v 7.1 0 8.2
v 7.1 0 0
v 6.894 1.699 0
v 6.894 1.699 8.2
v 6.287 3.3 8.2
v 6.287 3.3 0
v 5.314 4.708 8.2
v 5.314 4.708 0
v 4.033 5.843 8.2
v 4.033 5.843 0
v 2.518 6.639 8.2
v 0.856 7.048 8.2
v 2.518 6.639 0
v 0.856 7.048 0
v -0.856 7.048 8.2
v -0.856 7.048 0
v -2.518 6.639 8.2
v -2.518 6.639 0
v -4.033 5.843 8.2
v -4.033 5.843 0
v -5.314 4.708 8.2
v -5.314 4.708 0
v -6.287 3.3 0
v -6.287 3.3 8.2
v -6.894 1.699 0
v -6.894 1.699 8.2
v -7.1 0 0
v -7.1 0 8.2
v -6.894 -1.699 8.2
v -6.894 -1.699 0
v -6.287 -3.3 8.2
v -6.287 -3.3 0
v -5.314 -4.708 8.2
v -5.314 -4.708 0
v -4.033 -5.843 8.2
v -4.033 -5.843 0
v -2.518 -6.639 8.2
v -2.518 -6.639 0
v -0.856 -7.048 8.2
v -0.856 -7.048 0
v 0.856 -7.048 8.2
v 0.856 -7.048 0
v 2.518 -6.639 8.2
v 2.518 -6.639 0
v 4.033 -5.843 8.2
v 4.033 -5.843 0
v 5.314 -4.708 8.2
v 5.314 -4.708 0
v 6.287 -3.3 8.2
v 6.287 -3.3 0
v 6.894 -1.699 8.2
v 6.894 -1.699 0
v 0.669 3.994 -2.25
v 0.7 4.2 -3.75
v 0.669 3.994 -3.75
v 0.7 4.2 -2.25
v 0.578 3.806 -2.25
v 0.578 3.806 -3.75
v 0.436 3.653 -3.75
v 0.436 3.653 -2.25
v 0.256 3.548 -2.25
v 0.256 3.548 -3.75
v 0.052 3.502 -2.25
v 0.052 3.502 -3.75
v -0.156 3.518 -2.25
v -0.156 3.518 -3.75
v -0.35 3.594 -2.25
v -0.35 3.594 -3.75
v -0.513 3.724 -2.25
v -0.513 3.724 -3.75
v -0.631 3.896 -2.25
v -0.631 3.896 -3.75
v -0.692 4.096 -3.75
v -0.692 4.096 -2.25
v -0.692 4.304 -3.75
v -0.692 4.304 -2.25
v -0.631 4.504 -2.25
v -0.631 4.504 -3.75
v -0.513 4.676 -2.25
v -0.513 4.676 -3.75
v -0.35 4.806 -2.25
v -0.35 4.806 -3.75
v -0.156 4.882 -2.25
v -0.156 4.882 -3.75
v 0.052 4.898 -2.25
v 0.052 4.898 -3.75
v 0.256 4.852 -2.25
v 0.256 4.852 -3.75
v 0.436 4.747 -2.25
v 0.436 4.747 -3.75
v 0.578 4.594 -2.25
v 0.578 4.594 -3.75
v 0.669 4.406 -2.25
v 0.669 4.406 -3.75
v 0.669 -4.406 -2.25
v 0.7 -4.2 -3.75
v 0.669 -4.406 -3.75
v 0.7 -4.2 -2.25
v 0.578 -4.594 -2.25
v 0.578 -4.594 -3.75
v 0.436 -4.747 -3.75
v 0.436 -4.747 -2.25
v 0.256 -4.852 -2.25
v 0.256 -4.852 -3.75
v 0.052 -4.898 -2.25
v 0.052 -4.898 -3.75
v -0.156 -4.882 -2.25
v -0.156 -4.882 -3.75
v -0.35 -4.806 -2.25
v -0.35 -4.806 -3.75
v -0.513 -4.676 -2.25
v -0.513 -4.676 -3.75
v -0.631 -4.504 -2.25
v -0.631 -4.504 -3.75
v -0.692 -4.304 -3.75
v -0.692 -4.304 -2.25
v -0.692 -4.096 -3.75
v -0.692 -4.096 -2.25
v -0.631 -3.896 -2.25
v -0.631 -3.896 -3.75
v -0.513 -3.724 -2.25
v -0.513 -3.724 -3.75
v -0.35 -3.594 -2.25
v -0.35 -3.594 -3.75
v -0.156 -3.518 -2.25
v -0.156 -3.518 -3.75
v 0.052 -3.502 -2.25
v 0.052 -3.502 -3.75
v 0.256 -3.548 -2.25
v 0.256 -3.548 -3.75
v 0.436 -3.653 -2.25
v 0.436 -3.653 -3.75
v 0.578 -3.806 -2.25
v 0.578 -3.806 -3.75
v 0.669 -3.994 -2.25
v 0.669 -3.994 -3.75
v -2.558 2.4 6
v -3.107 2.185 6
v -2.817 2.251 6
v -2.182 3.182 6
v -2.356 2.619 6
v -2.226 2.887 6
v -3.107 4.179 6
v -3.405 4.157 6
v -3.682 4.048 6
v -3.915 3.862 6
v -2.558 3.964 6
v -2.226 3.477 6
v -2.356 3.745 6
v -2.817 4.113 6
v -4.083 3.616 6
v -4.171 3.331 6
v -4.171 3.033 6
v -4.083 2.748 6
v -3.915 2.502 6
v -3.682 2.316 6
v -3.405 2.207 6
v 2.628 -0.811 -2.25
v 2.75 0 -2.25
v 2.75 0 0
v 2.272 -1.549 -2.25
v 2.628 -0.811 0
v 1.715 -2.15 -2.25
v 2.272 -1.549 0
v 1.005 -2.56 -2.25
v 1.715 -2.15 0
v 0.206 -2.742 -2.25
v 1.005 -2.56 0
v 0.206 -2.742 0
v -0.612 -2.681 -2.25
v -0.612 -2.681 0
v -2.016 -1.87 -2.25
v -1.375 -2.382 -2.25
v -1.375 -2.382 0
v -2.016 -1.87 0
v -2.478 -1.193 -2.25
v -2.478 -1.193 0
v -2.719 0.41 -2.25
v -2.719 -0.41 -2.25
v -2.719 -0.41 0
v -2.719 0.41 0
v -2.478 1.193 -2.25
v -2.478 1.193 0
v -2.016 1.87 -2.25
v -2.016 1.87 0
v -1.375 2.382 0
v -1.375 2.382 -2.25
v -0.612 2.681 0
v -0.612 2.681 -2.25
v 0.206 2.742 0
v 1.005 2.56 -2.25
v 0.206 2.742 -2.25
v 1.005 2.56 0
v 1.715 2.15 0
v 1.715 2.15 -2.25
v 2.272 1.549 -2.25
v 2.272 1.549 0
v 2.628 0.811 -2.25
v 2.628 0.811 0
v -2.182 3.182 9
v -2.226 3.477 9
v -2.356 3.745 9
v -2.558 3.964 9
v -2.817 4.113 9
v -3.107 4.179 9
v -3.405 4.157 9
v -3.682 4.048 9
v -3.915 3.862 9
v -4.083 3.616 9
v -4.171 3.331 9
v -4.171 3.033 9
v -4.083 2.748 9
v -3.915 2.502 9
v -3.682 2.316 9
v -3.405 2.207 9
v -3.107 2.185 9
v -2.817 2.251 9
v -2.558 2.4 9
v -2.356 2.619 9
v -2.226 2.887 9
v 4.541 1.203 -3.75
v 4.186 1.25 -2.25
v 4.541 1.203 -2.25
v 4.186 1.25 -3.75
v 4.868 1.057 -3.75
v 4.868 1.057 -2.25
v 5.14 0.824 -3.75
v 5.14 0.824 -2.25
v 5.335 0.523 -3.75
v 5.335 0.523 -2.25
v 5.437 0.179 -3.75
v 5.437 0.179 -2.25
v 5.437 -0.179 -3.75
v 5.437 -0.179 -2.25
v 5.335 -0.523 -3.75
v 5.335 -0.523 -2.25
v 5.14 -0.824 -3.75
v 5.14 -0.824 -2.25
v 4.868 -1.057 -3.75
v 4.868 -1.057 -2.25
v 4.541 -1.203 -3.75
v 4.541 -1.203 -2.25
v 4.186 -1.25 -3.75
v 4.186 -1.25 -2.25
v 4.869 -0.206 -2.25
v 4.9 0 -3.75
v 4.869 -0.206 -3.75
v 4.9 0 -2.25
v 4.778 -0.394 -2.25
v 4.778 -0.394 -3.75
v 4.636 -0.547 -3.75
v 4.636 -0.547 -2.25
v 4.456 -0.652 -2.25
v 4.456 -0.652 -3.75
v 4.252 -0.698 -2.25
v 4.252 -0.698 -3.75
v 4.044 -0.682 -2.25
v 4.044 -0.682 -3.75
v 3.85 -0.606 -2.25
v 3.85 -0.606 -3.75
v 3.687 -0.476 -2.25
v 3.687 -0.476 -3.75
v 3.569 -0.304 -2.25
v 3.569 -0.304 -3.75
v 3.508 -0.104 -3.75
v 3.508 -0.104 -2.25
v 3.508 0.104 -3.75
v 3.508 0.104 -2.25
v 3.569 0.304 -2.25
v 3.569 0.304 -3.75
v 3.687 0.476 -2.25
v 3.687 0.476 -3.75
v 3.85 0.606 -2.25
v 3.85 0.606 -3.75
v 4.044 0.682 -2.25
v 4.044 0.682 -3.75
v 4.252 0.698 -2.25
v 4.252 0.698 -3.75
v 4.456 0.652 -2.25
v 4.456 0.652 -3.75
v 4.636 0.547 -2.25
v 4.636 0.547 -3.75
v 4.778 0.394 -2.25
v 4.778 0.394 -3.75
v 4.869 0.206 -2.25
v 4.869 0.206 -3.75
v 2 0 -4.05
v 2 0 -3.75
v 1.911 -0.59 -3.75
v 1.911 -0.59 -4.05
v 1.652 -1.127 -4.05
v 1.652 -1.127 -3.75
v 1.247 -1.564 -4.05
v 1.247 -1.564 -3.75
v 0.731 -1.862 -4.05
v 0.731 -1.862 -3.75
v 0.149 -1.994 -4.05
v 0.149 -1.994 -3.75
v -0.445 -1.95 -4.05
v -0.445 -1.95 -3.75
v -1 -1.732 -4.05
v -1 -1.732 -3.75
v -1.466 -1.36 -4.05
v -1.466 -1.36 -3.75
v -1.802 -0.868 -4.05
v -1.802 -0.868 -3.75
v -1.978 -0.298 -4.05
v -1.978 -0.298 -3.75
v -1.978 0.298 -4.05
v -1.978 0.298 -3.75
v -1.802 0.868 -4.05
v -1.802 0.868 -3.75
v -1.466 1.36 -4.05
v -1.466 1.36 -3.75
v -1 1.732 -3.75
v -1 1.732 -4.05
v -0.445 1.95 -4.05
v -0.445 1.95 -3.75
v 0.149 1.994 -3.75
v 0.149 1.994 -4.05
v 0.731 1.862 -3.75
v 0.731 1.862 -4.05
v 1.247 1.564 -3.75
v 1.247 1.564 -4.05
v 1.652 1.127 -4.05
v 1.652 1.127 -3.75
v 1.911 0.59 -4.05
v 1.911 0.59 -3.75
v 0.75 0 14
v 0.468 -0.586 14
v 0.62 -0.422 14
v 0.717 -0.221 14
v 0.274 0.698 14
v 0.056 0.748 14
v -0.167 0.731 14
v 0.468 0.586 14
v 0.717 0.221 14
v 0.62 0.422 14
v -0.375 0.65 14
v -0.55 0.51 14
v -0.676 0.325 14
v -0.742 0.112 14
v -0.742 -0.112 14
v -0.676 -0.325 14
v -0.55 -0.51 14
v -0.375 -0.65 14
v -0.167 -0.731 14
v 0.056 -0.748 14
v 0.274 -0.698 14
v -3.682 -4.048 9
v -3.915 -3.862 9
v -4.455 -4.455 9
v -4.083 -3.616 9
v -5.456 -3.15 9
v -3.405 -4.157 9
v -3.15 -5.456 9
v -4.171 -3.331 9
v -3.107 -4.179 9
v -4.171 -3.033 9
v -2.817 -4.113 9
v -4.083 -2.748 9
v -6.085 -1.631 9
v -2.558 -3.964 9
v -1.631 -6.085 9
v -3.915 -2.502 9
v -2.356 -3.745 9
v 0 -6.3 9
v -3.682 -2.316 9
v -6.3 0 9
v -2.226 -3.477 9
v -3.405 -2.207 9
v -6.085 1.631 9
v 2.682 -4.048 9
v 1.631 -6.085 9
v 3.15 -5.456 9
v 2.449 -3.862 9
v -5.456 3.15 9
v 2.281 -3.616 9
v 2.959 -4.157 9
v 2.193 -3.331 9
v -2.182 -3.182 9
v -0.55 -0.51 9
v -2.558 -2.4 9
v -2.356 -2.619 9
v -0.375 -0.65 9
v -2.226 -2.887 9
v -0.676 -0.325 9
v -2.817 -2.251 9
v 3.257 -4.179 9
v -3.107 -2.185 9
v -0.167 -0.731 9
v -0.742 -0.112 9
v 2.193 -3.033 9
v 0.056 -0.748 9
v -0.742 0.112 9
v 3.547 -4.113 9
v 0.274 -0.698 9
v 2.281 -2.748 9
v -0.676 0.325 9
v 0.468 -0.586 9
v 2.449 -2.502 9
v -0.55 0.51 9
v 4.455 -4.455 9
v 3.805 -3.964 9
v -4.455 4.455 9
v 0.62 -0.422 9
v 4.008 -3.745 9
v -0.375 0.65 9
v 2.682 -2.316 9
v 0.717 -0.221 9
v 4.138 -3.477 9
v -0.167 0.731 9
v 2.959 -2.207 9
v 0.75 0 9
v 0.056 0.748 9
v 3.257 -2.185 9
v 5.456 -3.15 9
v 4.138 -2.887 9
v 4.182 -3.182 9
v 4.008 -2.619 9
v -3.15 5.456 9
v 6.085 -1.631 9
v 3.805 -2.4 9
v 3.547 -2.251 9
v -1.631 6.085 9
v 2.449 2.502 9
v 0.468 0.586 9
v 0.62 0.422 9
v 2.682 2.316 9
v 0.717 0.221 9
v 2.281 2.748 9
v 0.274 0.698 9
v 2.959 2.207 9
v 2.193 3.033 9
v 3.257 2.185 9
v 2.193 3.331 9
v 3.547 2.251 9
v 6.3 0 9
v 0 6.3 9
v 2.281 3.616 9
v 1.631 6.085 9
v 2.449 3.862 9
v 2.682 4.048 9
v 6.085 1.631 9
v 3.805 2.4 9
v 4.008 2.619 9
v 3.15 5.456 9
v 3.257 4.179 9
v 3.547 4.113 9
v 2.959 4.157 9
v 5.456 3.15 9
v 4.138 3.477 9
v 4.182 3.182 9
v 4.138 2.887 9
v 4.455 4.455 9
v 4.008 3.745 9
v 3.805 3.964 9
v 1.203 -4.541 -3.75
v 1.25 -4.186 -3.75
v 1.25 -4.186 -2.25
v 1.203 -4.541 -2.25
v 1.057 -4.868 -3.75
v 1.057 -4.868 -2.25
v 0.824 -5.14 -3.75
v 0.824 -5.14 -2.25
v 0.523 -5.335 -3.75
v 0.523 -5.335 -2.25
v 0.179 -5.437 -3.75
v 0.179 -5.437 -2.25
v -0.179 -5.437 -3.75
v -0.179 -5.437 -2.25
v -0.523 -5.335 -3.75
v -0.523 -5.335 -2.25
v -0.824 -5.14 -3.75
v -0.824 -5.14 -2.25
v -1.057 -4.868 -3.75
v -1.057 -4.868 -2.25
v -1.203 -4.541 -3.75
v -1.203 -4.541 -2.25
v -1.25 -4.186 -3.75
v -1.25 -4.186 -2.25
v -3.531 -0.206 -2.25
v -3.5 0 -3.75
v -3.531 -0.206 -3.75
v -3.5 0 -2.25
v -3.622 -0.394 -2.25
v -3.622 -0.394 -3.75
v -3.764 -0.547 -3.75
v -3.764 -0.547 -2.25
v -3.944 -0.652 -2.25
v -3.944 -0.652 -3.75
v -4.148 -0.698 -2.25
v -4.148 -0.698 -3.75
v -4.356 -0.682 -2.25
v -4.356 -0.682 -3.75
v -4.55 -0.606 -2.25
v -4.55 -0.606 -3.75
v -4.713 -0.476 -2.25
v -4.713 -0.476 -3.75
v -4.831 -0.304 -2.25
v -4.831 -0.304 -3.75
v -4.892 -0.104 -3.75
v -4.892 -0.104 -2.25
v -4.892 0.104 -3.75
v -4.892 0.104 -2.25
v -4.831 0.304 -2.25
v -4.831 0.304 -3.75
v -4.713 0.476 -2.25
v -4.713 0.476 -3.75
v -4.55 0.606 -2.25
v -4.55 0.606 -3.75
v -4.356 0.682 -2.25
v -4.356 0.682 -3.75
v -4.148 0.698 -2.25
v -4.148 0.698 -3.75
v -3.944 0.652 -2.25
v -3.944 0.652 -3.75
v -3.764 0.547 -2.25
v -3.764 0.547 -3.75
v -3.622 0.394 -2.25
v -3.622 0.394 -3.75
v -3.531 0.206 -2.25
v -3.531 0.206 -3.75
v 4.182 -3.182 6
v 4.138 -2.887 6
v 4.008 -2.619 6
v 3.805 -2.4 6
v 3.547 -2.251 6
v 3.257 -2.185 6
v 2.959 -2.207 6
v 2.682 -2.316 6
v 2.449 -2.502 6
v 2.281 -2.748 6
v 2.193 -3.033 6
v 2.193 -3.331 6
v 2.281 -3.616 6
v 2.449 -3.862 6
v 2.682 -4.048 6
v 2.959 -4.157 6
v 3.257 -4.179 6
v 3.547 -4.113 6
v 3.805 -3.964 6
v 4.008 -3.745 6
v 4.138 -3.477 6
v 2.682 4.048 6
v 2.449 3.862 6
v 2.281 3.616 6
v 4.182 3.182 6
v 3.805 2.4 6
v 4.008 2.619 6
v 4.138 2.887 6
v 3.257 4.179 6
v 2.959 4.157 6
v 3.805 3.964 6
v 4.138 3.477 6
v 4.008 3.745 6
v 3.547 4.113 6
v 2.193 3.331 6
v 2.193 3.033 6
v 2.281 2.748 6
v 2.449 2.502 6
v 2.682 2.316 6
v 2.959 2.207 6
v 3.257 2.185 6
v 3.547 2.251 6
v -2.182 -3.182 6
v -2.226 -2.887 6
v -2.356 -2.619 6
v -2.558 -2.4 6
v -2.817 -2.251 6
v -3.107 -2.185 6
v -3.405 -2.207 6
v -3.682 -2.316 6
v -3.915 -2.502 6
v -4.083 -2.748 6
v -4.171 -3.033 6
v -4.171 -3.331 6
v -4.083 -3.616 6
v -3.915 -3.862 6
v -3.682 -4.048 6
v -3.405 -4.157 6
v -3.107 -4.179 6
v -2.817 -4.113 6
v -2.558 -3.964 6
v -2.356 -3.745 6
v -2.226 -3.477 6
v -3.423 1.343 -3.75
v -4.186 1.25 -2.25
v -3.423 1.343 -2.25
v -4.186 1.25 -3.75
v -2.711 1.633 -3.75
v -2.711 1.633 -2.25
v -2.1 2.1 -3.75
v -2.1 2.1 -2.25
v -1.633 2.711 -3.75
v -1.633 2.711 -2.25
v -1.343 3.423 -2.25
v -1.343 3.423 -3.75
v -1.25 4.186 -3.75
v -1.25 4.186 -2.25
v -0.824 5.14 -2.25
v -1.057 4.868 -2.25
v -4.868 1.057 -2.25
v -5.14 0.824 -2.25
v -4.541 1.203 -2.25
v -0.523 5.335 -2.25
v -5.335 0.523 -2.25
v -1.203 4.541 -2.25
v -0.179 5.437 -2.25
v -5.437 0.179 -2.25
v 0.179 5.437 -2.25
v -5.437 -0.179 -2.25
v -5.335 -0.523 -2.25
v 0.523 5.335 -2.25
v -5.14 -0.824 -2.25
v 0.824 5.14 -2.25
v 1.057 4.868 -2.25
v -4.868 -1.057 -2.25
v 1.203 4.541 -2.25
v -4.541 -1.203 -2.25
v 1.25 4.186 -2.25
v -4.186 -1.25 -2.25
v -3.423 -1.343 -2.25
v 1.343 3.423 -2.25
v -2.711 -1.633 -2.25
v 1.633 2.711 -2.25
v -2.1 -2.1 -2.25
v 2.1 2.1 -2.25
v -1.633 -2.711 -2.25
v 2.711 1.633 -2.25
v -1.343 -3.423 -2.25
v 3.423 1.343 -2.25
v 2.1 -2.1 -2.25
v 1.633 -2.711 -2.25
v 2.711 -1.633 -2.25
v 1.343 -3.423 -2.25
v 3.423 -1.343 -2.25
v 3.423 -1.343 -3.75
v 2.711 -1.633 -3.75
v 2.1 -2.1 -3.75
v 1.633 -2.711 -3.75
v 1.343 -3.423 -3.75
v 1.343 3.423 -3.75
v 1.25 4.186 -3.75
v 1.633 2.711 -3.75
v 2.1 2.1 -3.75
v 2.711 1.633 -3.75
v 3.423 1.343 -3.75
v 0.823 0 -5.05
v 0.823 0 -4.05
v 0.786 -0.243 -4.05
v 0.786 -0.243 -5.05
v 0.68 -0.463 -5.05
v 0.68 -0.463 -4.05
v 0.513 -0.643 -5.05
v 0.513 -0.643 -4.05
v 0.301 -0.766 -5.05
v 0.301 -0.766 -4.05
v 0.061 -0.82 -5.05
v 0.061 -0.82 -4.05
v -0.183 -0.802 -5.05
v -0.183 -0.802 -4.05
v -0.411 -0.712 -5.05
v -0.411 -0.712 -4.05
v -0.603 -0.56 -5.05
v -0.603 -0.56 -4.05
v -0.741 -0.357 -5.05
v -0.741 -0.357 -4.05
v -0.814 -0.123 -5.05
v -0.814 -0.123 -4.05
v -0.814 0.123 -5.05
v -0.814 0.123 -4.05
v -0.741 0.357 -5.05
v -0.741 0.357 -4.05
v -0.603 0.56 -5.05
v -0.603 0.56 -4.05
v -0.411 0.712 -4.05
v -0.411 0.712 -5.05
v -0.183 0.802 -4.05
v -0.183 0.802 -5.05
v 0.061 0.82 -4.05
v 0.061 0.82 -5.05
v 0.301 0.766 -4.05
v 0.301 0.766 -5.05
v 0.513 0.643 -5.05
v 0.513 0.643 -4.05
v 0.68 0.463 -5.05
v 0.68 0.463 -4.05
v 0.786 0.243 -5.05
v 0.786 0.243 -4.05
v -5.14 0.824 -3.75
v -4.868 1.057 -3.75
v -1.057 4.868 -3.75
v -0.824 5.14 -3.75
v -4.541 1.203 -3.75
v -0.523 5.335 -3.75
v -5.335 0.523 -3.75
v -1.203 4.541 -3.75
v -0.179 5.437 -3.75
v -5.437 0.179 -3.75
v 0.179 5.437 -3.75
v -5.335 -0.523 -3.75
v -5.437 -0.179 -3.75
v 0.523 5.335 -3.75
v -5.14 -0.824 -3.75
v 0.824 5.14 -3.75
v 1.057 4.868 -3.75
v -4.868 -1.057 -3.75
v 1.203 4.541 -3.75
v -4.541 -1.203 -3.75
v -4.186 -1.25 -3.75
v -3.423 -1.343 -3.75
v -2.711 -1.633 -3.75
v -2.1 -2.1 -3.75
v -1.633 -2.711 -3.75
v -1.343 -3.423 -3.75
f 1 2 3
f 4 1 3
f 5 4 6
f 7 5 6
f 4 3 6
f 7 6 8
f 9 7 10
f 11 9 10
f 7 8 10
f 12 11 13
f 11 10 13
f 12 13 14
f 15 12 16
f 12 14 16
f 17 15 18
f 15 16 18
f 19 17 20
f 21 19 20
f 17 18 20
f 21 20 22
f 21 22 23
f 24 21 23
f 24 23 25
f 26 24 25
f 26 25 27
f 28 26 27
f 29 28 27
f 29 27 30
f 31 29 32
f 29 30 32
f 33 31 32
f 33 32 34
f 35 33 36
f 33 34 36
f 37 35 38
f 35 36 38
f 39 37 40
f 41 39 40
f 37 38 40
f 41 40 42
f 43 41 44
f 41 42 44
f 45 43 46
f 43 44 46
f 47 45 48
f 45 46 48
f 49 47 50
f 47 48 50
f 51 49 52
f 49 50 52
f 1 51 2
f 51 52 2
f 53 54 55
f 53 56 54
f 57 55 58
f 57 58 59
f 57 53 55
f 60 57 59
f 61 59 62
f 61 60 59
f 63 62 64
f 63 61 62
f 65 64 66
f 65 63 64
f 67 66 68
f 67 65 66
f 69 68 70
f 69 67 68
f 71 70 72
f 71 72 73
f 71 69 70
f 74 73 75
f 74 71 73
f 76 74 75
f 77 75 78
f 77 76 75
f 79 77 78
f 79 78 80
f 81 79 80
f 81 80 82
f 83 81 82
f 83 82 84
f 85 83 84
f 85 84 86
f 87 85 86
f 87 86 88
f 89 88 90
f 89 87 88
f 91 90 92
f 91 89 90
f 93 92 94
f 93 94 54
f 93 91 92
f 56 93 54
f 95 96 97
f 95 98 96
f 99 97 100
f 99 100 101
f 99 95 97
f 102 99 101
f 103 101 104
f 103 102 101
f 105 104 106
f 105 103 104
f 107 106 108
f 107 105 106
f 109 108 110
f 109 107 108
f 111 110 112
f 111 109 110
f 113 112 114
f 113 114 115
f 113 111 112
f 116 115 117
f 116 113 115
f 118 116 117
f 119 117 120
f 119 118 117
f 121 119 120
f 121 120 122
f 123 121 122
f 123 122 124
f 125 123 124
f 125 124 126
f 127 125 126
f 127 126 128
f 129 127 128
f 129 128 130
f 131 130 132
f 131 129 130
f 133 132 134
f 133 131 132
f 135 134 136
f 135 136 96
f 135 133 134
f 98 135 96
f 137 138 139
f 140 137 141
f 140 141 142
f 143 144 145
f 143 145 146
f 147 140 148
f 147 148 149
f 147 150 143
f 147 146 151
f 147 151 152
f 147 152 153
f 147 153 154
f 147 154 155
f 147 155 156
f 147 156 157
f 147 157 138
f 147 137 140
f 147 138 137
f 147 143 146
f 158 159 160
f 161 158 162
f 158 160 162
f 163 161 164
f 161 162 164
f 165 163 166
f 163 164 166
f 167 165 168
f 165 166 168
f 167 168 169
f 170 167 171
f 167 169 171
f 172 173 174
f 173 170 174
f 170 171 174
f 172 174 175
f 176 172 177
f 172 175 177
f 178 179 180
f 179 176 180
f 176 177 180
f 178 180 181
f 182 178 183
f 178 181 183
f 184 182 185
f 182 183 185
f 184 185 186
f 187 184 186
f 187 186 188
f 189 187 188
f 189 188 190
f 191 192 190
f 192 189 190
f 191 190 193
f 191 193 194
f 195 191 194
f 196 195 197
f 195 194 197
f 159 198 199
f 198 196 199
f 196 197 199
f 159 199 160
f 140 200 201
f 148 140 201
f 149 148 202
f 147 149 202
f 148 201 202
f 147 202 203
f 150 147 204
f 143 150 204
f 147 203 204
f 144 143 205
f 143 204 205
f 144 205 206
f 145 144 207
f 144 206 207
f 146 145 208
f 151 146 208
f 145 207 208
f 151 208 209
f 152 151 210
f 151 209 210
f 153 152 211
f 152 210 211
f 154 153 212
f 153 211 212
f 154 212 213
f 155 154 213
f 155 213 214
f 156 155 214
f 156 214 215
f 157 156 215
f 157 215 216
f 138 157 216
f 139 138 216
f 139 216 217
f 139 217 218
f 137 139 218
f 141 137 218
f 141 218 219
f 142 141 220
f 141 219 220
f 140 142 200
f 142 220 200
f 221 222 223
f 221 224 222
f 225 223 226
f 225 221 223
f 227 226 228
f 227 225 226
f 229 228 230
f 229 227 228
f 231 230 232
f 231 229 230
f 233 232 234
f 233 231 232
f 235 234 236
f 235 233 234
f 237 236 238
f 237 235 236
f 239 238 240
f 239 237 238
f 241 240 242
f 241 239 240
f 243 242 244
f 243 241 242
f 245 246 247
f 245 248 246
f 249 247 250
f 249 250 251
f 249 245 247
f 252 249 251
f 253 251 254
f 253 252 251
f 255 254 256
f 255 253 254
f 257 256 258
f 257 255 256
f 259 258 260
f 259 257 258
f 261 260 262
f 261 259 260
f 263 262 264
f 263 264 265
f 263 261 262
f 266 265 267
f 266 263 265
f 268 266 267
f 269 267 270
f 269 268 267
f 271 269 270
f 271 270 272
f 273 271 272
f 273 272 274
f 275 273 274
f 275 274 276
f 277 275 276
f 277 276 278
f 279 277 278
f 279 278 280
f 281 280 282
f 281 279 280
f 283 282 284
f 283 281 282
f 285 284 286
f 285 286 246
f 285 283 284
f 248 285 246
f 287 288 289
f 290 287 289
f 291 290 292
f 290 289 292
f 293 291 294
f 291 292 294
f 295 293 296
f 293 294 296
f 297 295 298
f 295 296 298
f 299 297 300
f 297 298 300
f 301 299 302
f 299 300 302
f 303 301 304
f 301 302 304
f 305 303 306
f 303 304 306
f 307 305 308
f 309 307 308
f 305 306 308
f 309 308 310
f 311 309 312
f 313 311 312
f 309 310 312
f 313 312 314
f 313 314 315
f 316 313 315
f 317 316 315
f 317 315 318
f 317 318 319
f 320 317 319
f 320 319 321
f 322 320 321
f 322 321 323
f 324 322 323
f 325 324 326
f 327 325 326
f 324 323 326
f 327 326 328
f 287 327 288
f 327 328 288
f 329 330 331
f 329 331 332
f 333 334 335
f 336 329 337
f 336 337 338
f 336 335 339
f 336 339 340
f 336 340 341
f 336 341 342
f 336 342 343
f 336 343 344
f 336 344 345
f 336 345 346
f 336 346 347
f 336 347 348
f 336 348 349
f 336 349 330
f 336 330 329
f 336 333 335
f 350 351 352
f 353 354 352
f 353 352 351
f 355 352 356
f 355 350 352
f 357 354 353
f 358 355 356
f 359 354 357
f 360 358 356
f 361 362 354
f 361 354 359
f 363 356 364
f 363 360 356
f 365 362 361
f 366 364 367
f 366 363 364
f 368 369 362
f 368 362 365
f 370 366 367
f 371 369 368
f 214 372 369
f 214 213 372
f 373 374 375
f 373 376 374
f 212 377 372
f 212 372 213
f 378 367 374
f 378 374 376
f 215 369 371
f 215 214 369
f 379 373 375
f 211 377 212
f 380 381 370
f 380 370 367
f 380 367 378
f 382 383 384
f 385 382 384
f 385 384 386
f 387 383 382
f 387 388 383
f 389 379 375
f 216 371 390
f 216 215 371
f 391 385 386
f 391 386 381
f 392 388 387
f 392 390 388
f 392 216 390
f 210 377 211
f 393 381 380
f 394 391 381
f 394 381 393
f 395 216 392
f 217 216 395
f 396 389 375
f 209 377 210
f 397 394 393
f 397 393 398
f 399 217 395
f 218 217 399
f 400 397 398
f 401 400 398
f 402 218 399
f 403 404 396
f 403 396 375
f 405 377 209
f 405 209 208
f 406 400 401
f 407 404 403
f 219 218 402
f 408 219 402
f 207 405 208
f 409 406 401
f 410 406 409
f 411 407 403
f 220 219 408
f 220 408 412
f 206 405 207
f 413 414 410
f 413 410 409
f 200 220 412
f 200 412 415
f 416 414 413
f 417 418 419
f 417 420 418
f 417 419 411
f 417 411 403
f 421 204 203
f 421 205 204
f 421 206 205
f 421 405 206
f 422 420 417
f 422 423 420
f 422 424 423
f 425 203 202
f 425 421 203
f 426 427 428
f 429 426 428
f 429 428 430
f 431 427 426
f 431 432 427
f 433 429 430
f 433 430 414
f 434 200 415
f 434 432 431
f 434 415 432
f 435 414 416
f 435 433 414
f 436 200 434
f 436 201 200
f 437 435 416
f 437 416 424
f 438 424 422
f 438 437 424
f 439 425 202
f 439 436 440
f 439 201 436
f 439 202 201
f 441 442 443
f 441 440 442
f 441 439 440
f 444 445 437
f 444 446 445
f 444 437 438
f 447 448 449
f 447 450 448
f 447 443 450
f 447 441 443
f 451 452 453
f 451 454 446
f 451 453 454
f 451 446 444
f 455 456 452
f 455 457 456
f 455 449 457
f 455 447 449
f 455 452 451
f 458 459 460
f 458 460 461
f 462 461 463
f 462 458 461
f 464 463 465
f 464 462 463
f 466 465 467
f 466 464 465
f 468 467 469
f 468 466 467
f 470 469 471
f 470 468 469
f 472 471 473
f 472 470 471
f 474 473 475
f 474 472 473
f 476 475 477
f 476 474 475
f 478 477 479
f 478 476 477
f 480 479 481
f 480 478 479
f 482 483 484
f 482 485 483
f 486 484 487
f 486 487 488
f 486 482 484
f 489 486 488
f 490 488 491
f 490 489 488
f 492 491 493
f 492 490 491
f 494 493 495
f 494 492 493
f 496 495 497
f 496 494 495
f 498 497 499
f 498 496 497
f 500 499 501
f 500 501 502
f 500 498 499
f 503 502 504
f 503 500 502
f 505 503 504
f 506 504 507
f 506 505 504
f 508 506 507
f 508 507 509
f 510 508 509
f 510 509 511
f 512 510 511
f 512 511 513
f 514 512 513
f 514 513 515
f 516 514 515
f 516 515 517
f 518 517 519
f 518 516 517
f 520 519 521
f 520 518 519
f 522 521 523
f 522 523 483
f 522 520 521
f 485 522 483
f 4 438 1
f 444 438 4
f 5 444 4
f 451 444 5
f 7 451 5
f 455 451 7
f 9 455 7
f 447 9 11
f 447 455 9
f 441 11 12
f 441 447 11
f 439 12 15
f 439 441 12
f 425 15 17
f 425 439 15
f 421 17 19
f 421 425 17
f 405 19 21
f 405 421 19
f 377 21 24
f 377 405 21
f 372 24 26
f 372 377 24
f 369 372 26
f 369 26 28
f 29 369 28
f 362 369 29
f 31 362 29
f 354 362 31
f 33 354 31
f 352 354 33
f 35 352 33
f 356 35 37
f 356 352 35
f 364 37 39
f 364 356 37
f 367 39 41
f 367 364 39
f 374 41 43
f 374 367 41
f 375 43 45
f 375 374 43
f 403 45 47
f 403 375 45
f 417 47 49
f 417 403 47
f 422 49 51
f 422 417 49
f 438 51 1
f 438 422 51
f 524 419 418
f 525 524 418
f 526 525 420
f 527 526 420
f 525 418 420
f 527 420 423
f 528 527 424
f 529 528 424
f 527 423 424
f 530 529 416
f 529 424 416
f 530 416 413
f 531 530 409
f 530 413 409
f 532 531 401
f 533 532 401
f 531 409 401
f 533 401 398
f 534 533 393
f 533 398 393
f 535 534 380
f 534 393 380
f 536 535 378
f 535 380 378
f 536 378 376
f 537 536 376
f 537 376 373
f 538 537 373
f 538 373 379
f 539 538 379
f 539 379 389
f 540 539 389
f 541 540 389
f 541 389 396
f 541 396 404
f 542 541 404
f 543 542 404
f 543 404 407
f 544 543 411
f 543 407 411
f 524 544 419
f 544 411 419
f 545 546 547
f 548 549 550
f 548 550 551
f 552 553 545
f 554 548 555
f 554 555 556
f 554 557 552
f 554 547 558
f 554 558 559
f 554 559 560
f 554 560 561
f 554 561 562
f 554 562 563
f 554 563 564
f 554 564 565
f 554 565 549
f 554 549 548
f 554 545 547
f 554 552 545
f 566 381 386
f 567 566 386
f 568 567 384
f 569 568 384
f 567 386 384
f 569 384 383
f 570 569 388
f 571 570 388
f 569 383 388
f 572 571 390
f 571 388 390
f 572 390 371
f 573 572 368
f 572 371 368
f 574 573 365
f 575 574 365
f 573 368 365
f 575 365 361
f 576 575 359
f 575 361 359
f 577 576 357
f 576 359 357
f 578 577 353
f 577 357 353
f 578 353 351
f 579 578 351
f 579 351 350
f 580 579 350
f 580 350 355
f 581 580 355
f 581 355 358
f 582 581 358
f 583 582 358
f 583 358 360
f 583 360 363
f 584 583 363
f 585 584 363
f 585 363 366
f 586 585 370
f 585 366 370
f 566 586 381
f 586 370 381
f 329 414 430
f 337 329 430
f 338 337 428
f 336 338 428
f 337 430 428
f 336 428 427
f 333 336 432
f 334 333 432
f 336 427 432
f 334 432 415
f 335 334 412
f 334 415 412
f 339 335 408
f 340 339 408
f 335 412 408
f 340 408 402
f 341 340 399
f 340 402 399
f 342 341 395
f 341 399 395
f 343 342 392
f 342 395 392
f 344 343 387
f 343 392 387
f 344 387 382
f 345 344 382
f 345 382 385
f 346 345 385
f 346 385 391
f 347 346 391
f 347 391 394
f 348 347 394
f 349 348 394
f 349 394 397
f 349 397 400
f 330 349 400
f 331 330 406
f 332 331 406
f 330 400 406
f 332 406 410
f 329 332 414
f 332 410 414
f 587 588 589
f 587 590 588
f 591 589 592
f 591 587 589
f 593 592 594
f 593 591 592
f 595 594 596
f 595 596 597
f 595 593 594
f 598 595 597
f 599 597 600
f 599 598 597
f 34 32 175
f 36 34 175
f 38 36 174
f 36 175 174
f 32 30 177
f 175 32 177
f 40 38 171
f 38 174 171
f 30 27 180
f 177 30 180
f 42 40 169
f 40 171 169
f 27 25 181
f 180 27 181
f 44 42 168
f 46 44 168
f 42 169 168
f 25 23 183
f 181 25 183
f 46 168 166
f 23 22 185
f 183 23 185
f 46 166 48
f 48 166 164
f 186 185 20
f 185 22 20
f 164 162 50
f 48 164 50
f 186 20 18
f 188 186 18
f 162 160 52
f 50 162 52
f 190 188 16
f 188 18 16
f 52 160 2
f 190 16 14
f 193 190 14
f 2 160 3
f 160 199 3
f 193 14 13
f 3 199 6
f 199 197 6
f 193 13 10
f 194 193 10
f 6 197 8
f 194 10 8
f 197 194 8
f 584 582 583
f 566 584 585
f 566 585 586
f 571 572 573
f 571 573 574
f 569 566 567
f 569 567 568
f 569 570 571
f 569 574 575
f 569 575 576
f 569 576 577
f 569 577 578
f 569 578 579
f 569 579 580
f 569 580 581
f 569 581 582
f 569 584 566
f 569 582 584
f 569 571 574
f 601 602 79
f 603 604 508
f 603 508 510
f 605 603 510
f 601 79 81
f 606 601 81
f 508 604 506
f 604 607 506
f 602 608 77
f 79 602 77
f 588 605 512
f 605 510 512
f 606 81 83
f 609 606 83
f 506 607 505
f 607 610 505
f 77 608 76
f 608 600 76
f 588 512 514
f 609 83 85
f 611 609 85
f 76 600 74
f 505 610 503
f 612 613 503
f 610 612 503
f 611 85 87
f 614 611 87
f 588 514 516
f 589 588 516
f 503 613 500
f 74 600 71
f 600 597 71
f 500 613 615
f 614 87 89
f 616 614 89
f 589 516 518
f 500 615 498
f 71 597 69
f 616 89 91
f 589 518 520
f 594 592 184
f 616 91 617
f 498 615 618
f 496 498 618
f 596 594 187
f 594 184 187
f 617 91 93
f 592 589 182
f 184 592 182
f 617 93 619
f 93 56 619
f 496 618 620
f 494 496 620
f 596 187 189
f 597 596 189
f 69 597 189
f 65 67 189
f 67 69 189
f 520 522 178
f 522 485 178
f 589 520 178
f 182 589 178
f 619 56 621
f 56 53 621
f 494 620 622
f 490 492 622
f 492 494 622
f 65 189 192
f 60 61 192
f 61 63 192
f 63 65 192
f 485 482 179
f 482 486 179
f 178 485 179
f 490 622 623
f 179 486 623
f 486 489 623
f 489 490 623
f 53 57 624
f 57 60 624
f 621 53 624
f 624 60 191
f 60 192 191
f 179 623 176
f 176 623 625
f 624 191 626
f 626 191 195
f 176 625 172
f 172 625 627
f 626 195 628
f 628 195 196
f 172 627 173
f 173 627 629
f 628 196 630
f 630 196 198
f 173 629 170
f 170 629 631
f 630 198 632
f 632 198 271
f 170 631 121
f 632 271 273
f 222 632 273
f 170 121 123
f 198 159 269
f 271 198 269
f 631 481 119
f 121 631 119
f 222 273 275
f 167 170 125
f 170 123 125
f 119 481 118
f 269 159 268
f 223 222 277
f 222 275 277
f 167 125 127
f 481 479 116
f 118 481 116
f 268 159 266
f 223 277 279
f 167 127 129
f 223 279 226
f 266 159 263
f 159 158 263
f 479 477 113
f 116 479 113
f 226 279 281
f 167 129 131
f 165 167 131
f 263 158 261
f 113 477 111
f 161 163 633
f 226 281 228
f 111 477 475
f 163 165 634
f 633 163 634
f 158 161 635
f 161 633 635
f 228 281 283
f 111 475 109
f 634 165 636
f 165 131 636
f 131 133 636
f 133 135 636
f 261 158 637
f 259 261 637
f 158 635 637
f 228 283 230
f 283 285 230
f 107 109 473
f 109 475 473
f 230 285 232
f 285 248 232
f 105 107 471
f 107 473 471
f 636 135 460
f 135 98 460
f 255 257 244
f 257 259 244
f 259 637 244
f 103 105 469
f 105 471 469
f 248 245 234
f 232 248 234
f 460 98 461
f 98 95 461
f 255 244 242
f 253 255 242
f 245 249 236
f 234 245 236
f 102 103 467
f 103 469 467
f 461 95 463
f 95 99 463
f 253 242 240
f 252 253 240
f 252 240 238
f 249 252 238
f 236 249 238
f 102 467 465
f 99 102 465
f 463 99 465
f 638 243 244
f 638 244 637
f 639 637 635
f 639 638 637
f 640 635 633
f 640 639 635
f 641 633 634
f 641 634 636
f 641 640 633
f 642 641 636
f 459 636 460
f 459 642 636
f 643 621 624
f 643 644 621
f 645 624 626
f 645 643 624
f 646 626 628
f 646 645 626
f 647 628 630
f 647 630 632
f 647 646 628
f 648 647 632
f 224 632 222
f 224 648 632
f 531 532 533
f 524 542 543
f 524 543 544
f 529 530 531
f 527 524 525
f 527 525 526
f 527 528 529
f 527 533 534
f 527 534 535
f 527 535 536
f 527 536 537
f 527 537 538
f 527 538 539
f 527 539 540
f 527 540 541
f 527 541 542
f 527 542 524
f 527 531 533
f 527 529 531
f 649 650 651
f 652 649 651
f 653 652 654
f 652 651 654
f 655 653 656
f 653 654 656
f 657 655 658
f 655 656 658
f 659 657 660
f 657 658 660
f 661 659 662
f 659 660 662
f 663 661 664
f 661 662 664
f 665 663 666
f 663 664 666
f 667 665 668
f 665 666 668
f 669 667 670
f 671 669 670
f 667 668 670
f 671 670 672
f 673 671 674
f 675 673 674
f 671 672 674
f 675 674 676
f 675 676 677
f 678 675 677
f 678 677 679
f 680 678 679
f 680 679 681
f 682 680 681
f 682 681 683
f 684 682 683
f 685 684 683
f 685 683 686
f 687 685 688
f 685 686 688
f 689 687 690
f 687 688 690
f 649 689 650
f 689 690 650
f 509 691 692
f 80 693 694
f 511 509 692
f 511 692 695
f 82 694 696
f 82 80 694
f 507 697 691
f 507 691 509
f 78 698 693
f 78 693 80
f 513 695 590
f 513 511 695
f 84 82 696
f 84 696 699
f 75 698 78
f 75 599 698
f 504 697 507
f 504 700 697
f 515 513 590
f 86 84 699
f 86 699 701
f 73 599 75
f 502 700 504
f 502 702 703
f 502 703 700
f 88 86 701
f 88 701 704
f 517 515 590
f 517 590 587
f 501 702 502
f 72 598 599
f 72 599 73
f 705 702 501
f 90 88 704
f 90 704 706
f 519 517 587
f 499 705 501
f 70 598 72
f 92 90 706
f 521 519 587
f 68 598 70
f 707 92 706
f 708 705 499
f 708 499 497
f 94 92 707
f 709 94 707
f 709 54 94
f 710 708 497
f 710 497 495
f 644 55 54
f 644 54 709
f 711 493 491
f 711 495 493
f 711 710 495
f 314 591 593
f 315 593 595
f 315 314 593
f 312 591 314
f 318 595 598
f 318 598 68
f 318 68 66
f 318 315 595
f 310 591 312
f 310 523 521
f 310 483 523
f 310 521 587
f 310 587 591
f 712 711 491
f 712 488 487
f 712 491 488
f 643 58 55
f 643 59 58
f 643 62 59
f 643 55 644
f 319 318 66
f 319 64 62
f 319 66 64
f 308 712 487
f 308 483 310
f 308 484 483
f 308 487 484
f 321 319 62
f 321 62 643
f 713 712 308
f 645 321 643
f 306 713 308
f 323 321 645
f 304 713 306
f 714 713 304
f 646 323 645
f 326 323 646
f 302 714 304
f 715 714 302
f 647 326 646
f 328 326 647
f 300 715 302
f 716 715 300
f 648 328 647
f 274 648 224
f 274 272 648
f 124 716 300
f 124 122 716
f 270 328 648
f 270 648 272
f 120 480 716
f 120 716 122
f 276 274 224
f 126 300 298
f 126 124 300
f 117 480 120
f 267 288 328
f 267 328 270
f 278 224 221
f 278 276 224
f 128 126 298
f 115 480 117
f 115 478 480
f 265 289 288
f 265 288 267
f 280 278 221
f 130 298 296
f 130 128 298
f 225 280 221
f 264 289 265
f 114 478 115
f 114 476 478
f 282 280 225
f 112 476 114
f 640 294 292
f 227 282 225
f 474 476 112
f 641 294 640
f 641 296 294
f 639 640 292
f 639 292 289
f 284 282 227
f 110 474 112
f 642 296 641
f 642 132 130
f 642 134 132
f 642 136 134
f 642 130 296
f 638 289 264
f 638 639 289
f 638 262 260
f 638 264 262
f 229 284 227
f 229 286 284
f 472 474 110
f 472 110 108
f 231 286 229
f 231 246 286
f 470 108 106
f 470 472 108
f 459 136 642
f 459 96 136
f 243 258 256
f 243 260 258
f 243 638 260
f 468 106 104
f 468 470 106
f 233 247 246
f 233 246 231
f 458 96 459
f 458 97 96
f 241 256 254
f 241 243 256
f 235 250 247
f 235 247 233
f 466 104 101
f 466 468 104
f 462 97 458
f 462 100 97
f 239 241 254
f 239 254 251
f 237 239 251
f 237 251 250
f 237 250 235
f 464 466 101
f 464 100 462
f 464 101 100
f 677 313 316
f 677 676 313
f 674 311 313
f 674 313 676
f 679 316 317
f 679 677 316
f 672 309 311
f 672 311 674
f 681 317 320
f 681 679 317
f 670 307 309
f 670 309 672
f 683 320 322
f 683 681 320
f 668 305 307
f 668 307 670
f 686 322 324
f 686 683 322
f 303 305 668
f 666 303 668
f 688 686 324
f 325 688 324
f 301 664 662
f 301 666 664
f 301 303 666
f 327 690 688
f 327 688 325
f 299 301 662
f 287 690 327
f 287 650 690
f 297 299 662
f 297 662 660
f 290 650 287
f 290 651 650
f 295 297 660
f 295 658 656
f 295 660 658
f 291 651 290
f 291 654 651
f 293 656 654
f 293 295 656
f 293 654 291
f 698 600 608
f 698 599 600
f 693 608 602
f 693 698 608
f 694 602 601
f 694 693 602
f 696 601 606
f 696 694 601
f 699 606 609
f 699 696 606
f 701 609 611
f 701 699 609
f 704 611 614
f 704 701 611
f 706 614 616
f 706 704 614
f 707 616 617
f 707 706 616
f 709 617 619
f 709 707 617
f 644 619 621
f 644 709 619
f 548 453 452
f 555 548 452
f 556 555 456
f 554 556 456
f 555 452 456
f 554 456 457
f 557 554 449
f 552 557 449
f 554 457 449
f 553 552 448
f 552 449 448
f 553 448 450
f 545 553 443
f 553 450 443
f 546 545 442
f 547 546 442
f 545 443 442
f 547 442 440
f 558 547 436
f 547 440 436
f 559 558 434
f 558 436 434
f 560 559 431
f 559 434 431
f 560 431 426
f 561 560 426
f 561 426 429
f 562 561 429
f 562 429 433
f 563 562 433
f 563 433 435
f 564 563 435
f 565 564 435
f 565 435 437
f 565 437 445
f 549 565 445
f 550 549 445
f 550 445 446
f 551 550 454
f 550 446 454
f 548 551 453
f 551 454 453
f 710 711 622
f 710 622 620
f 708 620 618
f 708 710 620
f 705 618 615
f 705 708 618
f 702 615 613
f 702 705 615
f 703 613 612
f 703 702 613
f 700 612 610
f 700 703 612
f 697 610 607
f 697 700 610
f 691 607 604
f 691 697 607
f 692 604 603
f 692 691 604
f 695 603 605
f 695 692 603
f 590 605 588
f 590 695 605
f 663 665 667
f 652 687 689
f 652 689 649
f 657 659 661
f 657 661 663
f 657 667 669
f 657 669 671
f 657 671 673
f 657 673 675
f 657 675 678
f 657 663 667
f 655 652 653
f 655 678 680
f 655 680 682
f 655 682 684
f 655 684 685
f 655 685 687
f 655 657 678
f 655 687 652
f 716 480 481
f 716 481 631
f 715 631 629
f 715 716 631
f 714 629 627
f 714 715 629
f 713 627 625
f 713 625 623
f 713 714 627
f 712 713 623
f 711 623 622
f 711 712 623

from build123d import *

# Parameters (mm, degrees)
F0_R      = 7.1
F1_DEPTH  = 9
F2_R      = 0.75
F3_DEPTH  = 5
F4_R      = 1
F5_DEPTH  = 3
F6_R      = 2.75
F7_DEPTH  = 3
F8_R      = 0.7
F9_DEPTH  = 0.75
F10_R     = 2
F11_DEPTH = 0.3
F12_R     = 0.8227174872
F13_DEPTH = 1
F14_SIZE  = 0.8


with BuildPart() as f1:
    # F0 (on Top) → F1 (new body)
    with BuildSketch(Plane.XY):
        Circle(F0_R)
    extrude(amount=F1_DEPTH)

    # F2 (on face) → F3 (join)
    with BuildSketch(Plane.XY.offset(9)):
        Circle(F2_R)
    extrude(amount=F3_DEPTH)

    # F4 (on face) → F5 (cut)
    with BuildSketch(Plane.XY.offset(9)):
        with Locations((3.1819805153, 3.1819805153)):
            Circle(F4_R)
        with Locations((-3.1819805153, 3.1819805153)):
            Circle(F4_R)
        with Locations((-3.1819805153, -3.1819805153)):
            Circle(F4_R)
        with Locations((3.1819805153, -3.1819805153)):
            Circle(F4_R)
    extrude(amount=-F5_DEPTH, mode=Mode.SUBTRACT)

    # F6 (on face) → F7 (join)
    with BuildSketch(Plane(origin=(0, 0, 0), x_dir=(1, 0, 0), z_dir=(0, 0, -1))):
        Circle(F6_R)
    extrude(amount=F7_DEPTH)

    # F8 (on face) → F9 (join, symmetric)
    with BuildSketch(Plane(origin=(0, 0, -3), x_dir=(1, 0, 0), z_dir=(0, 0, -1))):
        with BuildLine():
            ThreePointArc((4.185713319, -1.25), (5.450081641, 0), (4.185713319, 1.25))
            ThreePointArc((4.185713319, 1.25), (3.0570558213, 1.4644635871), (2.1, 2.1))
            ThreePointArc((2.1, 2.1), (1.4644635871, 3.0570558213), (1.25, 4.185713319))
            ThreePointArc((1.25, 4.185713319), (0, 5.450081641), (-1.25, 4.185713319))
            ThreePointArc((-1.25, 4.185713319), (-1.4644635871, 3.0570558213), (-2.1, 2.1))
            ThreePointArc((-2.1, 2.1), (-3.0570558213, 1.4644635871), (-4.185713319, 1.25))
            ThreePointArc((-4.185713319, 1.25), (-5.450081641, 0), (-4.185713319, -1.25))
            ThreePointArc((-4.185713319, -1.25), (-3.0570558213, -1.4644635871), (-2.1, -2.1))
            ThreePointArc((-2.1, -2.1), (-1.4644635871, -3.0570558213), (-1.25, -4.185713319))
            ThreePointArc((-1.25, -4.185713319), (0, -5.450081641), (1.25, -4.185713319))
            ThreePointArc((1.25, -4.185713319), (1.4644635871, -3.0570558213), (2.1, -2.1))
            ThreePointArc((2.1, -2.1), (3.0570558213, -1.4644635871), (4.185713319, -1.25))
        make_face()
        with Locations((0, -4.2)):
            Circle(F8_R, mode=Mode.SUBTRACT)
        with Locations((-4.2, 0)):
            Circle(F8_R, mode=Mode.SUBTRACT)
        with Locations((4.2, 0)):
            Circle(F8_R, mode=Mode.SUBTRACT)
        with Locations((0, 4.2)):
            Circle(F8_R, mode=Mode.SUBTRACT)
    extrude(amount=F9_DEPTH, both=True)

    # F10 (on face) → F11 (join)
    with BuildSketch(Plane(origin=(0, 0, -3.75), x_dir=(1, 0, 0), z_dir=(0, 0, -1))):
        Circle(F10_R)
    extrude(amount=F11_DEPTH)

    # F12 (on face) → F13 (join)
    with BuildSketch(Plane(origin=(0, 0, -4.05), x_dir=(1, 0, 0), z_dir=(0, 0, -1))):
        Circle(F12_R)
    extrude(amount=F13_DEPTH)

    # F14
    f14_edges = [f1.edges().sort_by_distance(p)[0] for p in [
        (-7.1, 0, 9),
    ]]
    chamfer(f14_edges, length=F14_SIZE)


solid = f1.part
